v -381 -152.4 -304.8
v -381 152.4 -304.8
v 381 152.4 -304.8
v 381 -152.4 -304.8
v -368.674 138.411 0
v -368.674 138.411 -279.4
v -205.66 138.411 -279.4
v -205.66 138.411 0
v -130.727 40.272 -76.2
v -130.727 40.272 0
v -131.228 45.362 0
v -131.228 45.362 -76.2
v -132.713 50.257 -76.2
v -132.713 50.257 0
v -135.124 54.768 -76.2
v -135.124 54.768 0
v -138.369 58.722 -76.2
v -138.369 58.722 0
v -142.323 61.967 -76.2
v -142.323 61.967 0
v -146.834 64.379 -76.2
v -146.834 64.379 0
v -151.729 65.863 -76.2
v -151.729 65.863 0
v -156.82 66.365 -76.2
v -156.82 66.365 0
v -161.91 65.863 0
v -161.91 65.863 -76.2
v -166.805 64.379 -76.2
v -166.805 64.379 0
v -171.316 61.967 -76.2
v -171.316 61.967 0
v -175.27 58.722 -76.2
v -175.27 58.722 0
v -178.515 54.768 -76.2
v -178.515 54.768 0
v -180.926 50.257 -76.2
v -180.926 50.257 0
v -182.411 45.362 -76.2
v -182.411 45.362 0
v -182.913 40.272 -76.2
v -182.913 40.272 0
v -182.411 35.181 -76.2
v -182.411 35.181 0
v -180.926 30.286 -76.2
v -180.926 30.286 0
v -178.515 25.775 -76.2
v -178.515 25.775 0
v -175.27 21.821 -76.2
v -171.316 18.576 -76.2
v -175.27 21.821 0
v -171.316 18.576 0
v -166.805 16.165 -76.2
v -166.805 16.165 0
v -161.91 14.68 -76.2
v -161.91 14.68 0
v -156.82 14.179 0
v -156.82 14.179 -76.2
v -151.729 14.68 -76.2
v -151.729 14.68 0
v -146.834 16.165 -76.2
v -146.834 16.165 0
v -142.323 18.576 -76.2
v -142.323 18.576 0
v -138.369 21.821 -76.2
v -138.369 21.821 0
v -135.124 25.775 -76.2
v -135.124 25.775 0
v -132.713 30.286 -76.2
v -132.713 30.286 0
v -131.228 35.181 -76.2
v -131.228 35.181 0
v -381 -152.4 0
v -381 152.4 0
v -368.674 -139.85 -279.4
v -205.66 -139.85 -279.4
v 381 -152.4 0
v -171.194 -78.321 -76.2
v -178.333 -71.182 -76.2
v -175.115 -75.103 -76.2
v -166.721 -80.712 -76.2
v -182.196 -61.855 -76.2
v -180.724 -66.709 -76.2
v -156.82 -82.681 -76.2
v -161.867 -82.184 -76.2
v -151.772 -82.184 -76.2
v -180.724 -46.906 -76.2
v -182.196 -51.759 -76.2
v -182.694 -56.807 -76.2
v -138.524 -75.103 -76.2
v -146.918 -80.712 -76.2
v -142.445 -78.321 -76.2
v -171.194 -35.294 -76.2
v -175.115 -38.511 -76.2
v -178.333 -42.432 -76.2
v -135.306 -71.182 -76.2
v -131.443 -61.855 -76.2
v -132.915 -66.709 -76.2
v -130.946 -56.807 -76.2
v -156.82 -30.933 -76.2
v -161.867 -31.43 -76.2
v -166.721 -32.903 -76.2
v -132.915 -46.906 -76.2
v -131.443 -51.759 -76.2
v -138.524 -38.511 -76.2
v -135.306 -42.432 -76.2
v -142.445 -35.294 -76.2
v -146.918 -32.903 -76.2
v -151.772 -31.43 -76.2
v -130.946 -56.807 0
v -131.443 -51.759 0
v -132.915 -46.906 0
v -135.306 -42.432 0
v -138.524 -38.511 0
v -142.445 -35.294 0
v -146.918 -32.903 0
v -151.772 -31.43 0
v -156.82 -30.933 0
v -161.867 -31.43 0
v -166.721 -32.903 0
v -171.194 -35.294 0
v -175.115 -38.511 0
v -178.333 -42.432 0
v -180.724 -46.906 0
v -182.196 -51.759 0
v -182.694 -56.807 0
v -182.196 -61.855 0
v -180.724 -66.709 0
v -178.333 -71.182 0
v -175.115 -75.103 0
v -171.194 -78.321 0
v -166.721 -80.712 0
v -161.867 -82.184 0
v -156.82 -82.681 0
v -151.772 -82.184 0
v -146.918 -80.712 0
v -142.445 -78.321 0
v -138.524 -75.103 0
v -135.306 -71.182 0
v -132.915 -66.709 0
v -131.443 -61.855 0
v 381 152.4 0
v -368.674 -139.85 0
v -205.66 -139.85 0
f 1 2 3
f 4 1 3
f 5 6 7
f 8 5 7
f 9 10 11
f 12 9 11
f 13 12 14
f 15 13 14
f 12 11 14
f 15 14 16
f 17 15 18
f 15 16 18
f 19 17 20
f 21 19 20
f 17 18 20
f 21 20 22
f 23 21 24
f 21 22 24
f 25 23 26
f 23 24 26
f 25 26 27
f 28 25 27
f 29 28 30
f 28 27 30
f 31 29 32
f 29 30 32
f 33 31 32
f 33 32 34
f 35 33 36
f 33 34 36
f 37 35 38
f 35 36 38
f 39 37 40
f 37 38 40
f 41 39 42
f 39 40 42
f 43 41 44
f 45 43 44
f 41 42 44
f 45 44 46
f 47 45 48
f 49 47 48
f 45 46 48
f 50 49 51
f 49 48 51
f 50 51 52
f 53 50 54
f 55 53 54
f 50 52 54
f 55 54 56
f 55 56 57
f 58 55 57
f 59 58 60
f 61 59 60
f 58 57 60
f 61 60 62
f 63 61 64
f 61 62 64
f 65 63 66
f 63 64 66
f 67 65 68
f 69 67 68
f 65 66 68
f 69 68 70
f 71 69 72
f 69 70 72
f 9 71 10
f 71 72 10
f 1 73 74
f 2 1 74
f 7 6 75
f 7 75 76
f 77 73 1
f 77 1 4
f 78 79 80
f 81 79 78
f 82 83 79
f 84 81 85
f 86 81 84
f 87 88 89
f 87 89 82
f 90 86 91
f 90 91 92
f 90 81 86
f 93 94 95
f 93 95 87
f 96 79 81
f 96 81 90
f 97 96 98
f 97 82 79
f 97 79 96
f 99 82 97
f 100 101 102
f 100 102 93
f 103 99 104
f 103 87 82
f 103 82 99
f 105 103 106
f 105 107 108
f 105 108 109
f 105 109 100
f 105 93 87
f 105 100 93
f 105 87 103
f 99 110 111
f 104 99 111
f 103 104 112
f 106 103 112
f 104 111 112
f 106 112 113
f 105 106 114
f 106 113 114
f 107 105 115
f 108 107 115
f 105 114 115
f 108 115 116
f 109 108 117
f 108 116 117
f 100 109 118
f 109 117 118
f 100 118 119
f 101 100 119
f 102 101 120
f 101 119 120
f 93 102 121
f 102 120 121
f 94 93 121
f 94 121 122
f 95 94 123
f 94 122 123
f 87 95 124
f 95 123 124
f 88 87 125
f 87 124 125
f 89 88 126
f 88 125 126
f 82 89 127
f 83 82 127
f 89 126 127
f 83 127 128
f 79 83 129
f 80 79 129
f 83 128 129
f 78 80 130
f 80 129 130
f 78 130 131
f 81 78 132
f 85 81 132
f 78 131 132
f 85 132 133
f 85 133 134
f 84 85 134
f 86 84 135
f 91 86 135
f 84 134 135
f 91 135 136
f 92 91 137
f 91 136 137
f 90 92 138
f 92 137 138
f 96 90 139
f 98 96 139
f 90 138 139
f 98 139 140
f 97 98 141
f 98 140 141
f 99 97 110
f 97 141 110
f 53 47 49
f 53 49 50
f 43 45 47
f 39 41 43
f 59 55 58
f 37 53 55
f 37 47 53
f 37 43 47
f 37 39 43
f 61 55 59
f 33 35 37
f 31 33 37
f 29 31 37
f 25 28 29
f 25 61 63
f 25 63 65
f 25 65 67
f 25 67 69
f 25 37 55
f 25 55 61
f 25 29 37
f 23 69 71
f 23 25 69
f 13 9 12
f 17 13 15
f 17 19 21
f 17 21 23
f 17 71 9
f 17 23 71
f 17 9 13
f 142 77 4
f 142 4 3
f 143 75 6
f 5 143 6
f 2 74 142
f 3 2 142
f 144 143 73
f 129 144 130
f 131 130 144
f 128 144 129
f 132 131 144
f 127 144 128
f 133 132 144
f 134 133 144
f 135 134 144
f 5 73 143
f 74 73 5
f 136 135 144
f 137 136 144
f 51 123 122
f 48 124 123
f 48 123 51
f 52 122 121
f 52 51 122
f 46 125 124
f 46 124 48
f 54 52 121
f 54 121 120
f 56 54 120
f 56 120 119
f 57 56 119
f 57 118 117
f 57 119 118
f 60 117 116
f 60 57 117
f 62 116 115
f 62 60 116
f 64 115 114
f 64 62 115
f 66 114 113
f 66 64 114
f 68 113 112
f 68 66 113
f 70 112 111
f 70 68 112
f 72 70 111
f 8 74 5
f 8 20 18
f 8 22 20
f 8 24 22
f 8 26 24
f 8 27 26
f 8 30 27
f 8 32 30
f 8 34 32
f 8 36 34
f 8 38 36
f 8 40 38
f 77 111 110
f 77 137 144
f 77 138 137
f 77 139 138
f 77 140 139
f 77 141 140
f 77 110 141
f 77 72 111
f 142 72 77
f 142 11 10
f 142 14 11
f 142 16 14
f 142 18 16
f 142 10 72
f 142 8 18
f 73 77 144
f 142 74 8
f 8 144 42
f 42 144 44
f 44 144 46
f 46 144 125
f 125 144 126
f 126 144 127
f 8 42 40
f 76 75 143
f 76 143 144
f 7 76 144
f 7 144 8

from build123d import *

# Parameters (mm, degrees)
F0_W     = 762
F0_H     = 304.8
F1_DEPTH = 304.8
F2_W     = 163.013741
F2_H     = 278.260633
F3_DEPTH = 279.4
F4_R     = 26.093017
F4_R_2   = 25.87402
F5_DEPTH = 76.2


with BuildPart() as f1:
    # F0 (on Top) → F1 (new body)
    with BuildSketch(Plane.XY):
        Rectangle(F0_W, F0_H)
    extrude(amount=-F1_DEPTH)

    # F2 (on face) → F3 (cut)
    with BuildSketch(Plane.XY):
        with Locations((-287.166662, -0.719539)):
            Rectangle(F2_W, F2_H)
    extrude(amount=-F3_DEPTH, mode=Mode.SUBTRACT)

    # F4 (on face) → F5 (cut)
    with BuildSketch(Plane.XY):
        with Locations((-156.819597, 40.271699)):
            Circle(F4_R)
        with Locations((-156.819597, -56.807101)):
            Circle(F4_R_2)
    extrude(amount=-F5_DEPTH, mode=Mode.SUBTRACT)


solid = f1.part
